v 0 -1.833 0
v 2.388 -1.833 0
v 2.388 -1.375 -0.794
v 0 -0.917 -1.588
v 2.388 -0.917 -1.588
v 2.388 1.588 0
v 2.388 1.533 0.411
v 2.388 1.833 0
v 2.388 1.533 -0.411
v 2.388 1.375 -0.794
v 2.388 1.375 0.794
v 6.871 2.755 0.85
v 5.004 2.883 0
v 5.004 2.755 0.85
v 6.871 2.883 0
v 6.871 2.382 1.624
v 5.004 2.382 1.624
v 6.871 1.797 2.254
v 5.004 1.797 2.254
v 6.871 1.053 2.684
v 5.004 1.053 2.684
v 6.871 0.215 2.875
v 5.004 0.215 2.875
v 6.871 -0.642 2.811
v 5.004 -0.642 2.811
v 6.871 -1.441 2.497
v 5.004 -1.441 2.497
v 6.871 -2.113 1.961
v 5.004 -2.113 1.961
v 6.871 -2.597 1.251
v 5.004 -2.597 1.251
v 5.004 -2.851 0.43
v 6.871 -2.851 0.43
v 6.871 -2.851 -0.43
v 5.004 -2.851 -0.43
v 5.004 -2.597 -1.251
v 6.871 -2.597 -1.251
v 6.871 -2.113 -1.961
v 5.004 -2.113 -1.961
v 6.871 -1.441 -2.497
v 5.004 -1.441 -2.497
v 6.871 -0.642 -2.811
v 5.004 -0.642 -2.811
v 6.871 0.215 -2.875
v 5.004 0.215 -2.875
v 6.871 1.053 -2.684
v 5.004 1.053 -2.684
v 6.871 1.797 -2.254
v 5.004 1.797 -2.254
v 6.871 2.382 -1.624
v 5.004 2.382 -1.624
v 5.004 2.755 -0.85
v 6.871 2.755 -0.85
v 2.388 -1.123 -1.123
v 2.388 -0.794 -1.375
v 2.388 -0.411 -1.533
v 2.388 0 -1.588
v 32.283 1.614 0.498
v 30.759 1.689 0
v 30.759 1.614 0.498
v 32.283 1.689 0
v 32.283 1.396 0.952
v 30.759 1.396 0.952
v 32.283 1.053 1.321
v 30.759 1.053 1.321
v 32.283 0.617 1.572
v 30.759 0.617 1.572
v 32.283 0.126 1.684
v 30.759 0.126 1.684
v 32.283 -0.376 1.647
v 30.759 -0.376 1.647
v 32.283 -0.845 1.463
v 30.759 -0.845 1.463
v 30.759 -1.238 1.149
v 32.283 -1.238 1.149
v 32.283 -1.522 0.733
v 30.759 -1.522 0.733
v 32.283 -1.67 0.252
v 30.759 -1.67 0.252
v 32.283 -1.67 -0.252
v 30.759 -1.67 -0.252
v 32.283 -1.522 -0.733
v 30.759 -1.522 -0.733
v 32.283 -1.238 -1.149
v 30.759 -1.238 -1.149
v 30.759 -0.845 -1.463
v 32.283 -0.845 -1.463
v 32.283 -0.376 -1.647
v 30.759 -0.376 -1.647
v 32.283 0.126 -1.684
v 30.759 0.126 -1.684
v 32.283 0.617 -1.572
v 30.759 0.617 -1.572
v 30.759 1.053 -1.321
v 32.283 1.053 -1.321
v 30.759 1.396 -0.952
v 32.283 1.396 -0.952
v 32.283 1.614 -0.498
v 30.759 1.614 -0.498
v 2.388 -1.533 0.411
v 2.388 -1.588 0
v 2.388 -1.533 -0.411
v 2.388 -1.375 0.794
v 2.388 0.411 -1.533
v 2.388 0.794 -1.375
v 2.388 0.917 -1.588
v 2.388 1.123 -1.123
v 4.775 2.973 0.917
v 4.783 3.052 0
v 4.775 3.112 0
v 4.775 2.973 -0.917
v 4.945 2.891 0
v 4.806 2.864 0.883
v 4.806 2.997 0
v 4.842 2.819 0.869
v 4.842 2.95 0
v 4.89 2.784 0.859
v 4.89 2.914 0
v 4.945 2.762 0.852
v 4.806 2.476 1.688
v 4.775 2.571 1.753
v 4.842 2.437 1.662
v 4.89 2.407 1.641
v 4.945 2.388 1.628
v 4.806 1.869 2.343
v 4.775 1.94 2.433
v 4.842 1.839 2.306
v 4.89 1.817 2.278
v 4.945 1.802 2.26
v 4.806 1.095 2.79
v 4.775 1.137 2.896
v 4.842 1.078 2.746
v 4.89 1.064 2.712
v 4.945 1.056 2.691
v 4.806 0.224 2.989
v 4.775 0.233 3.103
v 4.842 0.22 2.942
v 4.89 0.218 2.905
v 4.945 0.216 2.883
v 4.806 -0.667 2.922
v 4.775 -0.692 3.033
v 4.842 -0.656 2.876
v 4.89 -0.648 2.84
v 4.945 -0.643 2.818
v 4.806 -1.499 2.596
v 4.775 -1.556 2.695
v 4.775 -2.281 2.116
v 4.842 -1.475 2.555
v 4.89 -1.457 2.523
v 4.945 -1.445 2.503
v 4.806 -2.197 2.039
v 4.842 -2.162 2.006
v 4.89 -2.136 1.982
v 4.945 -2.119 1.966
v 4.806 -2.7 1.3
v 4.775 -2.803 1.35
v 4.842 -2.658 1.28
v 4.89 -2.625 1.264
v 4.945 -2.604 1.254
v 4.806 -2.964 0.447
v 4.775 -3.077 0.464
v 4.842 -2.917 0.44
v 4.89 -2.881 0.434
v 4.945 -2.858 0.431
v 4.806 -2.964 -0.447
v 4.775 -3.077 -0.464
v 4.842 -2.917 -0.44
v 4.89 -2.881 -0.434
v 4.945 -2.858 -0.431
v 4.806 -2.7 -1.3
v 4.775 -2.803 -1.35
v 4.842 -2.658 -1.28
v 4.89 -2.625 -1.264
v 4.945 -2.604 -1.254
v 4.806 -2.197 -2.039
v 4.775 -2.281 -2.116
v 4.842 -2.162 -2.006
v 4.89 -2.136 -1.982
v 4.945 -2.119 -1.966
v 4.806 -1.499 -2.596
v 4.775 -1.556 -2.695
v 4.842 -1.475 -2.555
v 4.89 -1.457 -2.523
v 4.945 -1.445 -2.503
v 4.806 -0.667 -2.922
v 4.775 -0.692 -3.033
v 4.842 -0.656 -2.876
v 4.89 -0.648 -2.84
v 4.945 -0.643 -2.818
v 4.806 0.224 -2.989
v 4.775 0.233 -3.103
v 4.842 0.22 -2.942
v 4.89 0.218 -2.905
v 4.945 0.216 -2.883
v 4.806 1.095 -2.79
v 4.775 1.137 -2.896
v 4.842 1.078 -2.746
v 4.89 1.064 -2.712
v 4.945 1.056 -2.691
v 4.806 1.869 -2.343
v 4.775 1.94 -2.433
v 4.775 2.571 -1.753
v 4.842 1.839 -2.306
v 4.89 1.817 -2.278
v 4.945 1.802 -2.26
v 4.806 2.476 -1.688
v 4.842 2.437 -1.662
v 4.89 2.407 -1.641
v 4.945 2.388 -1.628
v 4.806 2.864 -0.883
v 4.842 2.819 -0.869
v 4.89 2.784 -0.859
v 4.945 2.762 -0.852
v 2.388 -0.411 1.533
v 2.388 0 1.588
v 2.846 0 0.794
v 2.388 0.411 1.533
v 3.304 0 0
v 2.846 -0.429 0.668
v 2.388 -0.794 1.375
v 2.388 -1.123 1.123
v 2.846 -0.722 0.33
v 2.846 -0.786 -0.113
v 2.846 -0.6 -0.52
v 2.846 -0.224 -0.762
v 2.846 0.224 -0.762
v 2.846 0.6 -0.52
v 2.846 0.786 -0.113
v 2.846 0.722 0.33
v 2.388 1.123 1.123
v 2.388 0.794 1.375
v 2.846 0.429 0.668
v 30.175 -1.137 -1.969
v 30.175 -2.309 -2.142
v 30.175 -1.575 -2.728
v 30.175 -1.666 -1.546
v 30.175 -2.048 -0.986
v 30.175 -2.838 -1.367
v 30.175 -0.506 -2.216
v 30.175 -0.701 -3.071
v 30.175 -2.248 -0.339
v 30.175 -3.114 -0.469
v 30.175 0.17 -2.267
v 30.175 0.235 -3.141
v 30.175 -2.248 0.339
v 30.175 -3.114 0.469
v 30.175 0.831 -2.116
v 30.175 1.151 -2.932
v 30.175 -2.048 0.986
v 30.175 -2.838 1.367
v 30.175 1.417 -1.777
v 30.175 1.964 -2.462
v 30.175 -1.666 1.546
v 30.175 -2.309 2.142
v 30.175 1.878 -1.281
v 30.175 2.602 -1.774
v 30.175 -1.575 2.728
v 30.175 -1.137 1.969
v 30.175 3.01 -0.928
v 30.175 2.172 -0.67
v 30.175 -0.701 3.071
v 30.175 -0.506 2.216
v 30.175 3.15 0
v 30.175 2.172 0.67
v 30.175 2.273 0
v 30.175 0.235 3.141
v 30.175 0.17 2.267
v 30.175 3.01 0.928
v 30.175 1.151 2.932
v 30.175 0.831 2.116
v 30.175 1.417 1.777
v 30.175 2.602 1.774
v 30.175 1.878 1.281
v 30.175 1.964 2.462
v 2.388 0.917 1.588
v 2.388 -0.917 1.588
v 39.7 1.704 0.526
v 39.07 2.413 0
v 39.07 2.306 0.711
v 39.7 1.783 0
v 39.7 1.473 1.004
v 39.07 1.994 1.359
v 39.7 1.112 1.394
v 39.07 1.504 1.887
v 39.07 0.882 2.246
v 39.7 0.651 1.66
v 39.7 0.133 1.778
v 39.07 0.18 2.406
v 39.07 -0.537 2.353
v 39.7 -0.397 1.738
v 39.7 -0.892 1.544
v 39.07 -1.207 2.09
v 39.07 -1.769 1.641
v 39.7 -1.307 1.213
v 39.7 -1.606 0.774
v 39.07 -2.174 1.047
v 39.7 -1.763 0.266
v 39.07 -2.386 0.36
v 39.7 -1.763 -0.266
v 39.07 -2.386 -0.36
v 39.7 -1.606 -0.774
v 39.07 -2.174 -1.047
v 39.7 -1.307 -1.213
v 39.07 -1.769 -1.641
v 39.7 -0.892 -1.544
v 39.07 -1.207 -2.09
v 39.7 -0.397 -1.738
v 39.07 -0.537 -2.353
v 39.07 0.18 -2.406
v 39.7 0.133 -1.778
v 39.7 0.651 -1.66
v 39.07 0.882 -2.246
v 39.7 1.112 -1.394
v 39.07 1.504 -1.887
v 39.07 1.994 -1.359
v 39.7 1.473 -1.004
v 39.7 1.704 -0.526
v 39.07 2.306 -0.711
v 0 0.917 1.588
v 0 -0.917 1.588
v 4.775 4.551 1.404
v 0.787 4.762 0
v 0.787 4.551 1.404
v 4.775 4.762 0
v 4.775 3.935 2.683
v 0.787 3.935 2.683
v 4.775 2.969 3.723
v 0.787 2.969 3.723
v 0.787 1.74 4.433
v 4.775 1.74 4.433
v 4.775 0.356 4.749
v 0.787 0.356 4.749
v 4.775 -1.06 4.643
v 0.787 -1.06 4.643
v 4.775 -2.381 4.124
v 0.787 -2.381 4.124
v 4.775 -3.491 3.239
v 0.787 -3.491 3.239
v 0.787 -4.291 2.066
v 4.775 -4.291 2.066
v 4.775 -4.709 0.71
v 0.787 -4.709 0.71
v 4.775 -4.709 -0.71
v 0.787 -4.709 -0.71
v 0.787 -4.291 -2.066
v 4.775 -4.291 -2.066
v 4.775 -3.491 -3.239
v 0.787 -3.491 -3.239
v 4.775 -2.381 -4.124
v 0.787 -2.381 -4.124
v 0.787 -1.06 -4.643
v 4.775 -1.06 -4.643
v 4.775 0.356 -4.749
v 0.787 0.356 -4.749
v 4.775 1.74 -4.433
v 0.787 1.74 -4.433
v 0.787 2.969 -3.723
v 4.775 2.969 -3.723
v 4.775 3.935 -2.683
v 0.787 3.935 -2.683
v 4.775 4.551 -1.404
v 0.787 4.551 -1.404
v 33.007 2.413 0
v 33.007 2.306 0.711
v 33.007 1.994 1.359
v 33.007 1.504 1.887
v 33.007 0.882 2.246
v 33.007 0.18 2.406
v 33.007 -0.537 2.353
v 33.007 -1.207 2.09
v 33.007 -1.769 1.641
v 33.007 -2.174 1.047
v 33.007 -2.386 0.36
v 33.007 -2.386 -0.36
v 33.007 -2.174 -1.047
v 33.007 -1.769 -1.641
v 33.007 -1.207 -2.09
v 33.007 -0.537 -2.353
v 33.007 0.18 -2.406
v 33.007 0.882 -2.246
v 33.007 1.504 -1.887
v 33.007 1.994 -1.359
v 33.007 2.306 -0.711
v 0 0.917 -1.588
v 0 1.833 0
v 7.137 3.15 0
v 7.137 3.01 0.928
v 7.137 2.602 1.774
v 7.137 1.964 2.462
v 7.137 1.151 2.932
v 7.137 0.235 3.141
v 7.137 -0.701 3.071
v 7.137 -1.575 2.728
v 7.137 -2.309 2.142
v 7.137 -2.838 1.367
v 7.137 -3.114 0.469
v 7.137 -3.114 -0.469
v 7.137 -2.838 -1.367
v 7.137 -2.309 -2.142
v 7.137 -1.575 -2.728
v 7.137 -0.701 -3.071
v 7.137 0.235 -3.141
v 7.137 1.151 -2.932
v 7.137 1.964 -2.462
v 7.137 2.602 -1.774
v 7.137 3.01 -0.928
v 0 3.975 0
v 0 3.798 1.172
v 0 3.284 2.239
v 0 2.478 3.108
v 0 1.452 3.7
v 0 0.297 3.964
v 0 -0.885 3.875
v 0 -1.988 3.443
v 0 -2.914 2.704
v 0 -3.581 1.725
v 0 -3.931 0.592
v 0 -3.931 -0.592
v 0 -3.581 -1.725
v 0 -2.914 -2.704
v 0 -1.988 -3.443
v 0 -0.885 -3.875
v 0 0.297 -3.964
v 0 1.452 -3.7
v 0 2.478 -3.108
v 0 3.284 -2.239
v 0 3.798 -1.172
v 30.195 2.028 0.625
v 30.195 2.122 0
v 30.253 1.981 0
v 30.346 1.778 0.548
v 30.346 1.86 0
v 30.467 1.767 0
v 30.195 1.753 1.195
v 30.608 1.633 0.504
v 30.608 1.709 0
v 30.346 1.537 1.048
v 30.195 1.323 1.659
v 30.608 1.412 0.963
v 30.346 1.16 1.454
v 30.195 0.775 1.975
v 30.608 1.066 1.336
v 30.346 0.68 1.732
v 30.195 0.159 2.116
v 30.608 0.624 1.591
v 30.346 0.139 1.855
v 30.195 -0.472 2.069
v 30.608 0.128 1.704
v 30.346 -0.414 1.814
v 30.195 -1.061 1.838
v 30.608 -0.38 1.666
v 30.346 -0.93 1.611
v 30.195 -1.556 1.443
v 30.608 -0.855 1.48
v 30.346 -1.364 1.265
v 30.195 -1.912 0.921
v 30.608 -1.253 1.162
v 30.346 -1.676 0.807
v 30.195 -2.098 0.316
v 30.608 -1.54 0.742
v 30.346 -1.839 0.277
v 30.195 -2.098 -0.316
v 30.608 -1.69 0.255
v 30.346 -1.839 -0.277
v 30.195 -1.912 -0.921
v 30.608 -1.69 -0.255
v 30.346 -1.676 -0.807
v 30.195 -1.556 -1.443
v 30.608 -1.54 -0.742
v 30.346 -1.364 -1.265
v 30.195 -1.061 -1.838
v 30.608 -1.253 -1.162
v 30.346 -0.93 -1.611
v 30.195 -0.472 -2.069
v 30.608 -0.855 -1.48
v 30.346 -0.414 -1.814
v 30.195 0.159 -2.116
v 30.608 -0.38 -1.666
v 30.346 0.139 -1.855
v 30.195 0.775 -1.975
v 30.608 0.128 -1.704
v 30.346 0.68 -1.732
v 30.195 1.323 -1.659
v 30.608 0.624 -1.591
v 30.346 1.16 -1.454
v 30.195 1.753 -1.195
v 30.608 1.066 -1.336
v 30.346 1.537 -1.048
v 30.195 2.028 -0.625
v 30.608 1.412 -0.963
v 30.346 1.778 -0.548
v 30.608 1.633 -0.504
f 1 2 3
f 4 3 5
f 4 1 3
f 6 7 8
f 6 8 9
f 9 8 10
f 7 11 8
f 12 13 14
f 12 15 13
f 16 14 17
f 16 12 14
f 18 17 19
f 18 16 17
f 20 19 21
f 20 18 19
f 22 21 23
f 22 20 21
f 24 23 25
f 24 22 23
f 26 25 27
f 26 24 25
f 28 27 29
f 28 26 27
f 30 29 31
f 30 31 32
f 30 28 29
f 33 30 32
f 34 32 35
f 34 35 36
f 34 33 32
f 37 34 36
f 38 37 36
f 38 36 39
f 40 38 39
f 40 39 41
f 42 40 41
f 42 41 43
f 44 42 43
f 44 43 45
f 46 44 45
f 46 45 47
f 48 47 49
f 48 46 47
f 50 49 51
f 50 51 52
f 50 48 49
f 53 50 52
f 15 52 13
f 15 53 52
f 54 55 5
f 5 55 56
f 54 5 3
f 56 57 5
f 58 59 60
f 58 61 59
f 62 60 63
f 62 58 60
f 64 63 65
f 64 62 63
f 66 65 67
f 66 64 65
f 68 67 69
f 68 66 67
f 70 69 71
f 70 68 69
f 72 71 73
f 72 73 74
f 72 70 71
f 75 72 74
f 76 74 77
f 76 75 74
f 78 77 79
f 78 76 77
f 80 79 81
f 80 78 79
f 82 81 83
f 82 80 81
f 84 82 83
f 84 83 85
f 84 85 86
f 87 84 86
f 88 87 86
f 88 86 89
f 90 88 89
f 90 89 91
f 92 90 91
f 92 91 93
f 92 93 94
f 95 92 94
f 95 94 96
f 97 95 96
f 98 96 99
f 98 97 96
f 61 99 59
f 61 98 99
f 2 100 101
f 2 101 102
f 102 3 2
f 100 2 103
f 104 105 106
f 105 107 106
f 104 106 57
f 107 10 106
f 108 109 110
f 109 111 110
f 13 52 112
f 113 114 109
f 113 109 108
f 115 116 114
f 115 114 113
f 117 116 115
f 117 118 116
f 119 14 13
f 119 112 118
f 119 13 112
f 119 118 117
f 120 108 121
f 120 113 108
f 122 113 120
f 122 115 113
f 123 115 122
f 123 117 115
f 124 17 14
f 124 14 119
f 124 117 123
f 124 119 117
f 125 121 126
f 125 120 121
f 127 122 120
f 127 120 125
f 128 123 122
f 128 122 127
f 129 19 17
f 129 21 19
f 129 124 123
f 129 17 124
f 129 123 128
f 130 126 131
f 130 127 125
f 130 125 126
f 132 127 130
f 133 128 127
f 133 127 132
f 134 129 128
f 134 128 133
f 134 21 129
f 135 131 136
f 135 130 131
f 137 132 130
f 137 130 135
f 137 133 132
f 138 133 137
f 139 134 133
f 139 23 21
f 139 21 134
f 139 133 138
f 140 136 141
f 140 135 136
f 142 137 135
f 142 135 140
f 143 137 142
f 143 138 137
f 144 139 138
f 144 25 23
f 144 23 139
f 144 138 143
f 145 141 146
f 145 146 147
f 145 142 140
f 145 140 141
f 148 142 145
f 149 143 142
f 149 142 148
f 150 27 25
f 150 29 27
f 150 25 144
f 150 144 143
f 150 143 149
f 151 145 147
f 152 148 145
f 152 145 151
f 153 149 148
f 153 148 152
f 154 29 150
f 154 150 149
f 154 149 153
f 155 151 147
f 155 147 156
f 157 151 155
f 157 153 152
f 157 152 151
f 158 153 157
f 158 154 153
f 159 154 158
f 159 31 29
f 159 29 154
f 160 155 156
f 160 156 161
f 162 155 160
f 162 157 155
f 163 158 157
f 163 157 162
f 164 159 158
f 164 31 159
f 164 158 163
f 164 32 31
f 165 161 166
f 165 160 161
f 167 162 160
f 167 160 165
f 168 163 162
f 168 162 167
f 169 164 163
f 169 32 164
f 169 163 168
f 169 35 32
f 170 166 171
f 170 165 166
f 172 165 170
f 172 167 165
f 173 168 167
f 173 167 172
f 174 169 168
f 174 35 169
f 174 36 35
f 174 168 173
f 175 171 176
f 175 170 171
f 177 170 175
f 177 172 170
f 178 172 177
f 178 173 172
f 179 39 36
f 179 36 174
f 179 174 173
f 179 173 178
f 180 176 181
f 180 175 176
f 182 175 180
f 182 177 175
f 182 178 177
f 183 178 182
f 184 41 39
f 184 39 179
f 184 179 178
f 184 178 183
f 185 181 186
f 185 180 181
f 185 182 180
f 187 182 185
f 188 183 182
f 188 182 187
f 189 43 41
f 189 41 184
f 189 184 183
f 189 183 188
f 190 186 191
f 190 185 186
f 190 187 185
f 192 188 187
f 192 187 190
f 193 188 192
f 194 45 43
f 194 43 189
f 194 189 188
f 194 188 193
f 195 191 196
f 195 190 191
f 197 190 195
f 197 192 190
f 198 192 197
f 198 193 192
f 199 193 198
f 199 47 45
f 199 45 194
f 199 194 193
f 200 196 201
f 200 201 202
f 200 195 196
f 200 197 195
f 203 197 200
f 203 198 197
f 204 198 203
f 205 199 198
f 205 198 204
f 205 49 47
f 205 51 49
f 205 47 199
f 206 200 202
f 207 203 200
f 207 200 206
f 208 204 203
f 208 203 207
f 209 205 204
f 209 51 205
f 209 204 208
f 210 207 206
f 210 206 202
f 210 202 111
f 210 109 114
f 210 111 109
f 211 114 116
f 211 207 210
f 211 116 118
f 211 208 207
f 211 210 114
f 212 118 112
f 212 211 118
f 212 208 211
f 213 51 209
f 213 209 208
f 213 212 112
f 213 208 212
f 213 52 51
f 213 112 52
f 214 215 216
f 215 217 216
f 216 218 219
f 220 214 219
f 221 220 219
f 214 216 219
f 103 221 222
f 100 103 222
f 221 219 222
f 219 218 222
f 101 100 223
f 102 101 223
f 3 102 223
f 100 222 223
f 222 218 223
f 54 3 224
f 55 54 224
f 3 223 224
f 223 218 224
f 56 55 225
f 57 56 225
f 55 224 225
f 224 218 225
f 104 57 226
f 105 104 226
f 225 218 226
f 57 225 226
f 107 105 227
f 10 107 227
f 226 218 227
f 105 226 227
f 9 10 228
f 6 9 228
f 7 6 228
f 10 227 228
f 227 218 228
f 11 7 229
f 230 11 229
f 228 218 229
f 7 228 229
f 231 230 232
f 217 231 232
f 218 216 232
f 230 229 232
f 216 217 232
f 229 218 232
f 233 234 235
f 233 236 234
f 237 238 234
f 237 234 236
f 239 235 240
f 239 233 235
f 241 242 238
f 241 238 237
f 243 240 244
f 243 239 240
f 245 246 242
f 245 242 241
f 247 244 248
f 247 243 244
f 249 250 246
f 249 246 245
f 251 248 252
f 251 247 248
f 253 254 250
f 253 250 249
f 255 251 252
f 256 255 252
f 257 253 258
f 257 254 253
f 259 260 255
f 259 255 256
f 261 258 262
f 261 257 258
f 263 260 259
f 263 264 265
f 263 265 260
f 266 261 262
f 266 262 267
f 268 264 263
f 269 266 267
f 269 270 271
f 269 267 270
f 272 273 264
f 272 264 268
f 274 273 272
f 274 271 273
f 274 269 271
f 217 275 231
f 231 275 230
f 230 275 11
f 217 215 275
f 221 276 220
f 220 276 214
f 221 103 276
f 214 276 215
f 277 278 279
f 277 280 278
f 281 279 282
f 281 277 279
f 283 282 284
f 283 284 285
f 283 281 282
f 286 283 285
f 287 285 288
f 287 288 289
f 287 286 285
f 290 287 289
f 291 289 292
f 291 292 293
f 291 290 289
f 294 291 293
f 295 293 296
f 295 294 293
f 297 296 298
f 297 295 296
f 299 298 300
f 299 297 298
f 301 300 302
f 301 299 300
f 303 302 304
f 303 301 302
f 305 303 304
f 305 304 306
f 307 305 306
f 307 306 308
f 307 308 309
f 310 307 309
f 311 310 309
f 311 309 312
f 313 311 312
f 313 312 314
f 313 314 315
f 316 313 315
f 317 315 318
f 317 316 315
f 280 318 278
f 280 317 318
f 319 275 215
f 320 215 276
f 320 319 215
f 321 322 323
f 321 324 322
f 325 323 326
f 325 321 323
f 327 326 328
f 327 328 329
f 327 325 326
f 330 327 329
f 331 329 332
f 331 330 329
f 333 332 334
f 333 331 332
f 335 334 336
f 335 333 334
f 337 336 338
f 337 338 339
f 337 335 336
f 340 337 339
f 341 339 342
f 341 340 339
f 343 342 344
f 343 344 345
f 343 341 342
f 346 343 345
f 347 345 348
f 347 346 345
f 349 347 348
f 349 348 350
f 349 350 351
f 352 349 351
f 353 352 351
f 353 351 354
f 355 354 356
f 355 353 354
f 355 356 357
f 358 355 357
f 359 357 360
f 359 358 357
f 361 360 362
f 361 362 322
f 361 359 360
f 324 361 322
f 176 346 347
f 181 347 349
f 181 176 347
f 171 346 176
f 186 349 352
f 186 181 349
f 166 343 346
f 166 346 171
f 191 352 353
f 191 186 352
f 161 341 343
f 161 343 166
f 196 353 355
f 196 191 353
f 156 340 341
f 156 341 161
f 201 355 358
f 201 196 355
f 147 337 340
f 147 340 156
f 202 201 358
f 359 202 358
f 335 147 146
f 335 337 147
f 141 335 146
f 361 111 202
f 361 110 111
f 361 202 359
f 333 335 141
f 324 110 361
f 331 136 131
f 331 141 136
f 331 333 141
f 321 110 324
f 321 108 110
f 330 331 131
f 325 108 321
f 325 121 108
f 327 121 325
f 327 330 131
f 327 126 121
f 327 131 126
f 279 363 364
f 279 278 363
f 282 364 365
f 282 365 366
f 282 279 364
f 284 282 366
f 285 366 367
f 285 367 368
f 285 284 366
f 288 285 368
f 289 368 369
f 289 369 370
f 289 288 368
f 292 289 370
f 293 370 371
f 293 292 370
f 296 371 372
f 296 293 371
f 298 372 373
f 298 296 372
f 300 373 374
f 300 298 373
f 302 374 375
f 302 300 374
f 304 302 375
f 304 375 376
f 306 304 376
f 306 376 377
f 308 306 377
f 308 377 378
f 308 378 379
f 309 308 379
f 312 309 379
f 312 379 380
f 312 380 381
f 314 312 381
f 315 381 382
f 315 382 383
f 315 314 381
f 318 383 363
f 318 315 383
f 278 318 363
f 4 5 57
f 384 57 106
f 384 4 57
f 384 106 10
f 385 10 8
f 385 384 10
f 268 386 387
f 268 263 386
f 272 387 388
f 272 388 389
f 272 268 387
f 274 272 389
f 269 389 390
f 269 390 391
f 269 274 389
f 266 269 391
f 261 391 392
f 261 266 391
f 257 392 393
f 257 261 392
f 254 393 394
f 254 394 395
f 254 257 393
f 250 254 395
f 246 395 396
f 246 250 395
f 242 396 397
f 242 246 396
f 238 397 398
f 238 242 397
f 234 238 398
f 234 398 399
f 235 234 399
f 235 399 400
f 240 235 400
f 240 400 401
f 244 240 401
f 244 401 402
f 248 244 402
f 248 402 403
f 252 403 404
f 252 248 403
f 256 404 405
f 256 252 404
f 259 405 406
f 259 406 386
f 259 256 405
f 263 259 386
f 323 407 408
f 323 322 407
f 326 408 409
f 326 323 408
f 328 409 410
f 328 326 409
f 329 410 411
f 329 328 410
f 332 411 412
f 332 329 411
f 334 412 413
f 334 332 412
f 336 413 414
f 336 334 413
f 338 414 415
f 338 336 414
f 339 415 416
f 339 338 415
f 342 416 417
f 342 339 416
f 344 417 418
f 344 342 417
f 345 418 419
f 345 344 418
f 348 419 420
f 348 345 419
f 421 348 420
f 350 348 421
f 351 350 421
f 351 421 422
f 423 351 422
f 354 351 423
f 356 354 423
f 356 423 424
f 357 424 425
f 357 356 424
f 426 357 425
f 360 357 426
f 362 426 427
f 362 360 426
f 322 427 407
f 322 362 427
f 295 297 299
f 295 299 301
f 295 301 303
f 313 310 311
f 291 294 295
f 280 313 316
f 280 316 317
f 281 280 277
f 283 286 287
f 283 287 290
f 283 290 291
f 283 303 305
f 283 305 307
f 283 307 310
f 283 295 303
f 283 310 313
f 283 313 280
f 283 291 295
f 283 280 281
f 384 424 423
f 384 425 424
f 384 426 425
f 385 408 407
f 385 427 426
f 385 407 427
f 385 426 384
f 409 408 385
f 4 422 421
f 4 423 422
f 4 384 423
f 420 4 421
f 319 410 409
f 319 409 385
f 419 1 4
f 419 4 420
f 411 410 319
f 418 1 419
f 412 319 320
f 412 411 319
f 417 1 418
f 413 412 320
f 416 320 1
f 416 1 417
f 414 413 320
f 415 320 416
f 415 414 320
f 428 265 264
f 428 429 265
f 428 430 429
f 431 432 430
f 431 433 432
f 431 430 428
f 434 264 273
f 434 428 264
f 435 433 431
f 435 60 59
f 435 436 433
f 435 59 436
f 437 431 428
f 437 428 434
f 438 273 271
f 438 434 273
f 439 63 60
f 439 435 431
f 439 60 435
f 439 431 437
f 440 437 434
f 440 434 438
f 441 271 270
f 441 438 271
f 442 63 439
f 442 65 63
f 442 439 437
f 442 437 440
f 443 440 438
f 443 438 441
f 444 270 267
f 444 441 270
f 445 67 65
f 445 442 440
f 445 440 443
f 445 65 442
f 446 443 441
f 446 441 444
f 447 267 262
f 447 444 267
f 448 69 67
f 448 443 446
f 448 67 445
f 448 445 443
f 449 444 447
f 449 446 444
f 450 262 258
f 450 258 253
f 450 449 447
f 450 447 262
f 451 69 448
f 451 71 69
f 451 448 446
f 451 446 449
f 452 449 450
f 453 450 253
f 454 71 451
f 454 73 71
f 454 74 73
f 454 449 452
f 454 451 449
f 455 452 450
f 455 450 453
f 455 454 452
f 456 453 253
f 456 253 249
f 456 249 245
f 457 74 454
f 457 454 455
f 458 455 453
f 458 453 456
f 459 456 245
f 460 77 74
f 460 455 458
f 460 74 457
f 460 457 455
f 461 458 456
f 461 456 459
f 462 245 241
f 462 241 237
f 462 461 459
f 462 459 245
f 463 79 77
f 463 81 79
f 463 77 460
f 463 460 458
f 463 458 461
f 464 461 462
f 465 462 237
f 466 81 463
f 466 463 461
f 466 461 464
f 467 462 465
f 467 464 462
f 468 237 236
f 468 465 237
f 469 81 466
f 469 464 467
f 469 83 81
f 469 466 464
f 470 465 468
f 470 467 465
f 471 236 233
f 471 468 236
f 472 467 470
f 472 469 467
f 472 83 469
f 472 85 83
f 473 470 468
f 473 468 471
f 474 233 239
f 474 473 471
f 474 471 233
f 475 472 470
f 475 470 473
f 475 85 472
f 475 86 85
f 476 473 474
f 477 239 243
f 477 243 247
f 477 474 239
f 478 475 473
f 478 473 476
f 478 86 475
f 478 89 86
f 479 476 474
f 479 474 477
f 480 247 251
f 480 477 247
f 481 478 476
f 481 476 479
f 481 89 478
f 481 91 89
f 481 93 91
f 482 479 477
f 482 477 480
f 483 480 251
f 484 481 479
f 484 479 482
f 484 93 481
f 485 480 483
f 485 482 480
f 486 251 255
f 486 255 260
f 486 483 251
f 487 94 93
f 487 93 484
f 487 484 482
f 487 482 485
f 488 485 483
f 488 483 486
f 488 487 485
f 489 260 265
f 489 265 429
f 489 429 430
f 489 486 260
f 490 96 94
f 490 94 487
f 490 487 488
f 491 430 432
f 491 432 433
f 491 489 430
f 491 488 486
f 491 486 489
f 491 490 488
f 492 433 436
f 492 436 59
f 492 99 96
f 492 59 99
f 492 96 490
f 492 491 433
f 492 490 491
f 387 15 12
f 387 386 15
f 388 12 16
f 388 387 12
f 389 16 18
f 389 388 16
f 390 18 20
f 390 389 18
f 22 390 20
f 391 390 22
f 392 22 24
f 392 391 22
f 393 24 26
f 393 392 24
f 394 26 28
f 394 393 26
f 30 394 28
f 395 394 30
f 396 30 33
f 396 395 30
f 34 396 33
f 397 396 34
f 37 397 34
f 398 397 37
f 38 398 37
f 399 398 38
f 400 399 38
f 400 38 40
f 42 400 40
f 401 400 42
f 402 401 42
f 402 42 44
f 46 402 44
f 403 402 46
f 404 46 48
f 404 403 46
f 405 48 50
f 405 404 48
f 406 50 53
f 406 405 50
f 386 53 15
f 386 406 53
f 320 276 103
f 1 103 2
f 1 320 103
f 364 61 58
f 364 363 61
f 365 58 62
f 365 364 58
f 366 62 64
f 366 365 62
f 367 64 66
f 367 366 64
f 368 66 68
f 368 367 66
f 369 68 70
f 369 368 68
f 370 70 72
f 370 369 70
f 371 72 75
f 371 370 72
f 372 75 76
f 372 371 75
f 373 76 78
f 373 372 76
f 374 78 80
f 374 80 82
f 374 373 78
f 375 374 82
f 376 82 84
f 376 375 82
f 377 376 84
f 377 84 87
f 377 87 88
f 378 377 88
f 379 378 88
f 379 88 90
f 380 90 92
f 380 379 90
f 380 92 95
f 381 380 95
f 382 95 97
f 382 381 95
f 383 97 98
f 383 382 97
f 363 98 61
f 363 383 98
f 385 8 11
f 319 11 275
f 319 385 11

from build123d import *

# Parameters (mm, degrees)
HEX_2_DEPTH = 2.3876


# Read off the part's stored shape, not the designer's step: ThreadSchematic
with BuildPart() as part:
    # ThreadSchematic outline → ThreadSchematic (revolve)
    with BuildSketch(Plane.YX):
        with BuildLine():
            Line((0, 39.7002), (0, 0))
            Line((0, 0), (3.9751, 0))
            Line((3.9751, 0), (4.7625, 0.7874))
            Line((4.7625, 0.7874), (4.7625, 4.7752))
            Line((4.7625, 4.7752), (3.1115, 4.7752))
            ThreePointArc((3.1115, 4.7752), (2.94985539, 4.84215539), (2.8829, 5.0038))
            Line((2.8829, 5.0038), (2.8829, 6.8707))
            Line((2.8829, 6.8707), (3.1496, 7.1374))
            Line((3.1496, 7.1374), (3.1496, 30.1752))
            Line((3.1496, 30.1752), (2.2733, 30.1752))
            ThreePointArc((2.2733, 30.1752), (1.860208218, 30.346308218), (1.6891, 30.7594))
            Line((1.6891, 30.7594), (1.6891, 32.2834))
            Line((1.6891, 32.2834), (2.413, 33.0073))
            Line((2.413, 33.0073), (2.413, 39.07028))
            Line((2.413, 39.07028), (1.78308, 39.7002))
            Line((1.78308, 39.7002), (0, 39.7002))
        make_face()
    revolve(axis=Axis((0, 0, 0), (1, 0, 0)))

    # Sketch2 → PreBroach (revolve, cut)
    with BuildSketch(Plane.XY, mode=Mode.PRIVATE) as prebroach_sk:
        Polygon((0, 1.5875), (2.3876, 1.5875), (3.304143552, 0), (0, 0), align=None)
    revolve(prebroach_sk.sketch.rotate(Axis((0, 0, 0), (1, 0, 0)), 90), axis=Axis((0, 0, 0), (1, 0, 0)), mode=Mode.SUBTRACT)

    # Sketch3 → Hex 2 (cut)
    with BuildSketch(Plane.ZY):
        Polygon((-1.5875, -0.916543552), (-1.5875, 0.916543552), (0, 1.833087105), (1.5875, 0.916543552), (1.5875, -0.916543552), (0, -1.833087105), align=None)
    extrude(amount=-HEX_2_DEPTH, mode=Mode.SUBTRACT)


solid = part.part
